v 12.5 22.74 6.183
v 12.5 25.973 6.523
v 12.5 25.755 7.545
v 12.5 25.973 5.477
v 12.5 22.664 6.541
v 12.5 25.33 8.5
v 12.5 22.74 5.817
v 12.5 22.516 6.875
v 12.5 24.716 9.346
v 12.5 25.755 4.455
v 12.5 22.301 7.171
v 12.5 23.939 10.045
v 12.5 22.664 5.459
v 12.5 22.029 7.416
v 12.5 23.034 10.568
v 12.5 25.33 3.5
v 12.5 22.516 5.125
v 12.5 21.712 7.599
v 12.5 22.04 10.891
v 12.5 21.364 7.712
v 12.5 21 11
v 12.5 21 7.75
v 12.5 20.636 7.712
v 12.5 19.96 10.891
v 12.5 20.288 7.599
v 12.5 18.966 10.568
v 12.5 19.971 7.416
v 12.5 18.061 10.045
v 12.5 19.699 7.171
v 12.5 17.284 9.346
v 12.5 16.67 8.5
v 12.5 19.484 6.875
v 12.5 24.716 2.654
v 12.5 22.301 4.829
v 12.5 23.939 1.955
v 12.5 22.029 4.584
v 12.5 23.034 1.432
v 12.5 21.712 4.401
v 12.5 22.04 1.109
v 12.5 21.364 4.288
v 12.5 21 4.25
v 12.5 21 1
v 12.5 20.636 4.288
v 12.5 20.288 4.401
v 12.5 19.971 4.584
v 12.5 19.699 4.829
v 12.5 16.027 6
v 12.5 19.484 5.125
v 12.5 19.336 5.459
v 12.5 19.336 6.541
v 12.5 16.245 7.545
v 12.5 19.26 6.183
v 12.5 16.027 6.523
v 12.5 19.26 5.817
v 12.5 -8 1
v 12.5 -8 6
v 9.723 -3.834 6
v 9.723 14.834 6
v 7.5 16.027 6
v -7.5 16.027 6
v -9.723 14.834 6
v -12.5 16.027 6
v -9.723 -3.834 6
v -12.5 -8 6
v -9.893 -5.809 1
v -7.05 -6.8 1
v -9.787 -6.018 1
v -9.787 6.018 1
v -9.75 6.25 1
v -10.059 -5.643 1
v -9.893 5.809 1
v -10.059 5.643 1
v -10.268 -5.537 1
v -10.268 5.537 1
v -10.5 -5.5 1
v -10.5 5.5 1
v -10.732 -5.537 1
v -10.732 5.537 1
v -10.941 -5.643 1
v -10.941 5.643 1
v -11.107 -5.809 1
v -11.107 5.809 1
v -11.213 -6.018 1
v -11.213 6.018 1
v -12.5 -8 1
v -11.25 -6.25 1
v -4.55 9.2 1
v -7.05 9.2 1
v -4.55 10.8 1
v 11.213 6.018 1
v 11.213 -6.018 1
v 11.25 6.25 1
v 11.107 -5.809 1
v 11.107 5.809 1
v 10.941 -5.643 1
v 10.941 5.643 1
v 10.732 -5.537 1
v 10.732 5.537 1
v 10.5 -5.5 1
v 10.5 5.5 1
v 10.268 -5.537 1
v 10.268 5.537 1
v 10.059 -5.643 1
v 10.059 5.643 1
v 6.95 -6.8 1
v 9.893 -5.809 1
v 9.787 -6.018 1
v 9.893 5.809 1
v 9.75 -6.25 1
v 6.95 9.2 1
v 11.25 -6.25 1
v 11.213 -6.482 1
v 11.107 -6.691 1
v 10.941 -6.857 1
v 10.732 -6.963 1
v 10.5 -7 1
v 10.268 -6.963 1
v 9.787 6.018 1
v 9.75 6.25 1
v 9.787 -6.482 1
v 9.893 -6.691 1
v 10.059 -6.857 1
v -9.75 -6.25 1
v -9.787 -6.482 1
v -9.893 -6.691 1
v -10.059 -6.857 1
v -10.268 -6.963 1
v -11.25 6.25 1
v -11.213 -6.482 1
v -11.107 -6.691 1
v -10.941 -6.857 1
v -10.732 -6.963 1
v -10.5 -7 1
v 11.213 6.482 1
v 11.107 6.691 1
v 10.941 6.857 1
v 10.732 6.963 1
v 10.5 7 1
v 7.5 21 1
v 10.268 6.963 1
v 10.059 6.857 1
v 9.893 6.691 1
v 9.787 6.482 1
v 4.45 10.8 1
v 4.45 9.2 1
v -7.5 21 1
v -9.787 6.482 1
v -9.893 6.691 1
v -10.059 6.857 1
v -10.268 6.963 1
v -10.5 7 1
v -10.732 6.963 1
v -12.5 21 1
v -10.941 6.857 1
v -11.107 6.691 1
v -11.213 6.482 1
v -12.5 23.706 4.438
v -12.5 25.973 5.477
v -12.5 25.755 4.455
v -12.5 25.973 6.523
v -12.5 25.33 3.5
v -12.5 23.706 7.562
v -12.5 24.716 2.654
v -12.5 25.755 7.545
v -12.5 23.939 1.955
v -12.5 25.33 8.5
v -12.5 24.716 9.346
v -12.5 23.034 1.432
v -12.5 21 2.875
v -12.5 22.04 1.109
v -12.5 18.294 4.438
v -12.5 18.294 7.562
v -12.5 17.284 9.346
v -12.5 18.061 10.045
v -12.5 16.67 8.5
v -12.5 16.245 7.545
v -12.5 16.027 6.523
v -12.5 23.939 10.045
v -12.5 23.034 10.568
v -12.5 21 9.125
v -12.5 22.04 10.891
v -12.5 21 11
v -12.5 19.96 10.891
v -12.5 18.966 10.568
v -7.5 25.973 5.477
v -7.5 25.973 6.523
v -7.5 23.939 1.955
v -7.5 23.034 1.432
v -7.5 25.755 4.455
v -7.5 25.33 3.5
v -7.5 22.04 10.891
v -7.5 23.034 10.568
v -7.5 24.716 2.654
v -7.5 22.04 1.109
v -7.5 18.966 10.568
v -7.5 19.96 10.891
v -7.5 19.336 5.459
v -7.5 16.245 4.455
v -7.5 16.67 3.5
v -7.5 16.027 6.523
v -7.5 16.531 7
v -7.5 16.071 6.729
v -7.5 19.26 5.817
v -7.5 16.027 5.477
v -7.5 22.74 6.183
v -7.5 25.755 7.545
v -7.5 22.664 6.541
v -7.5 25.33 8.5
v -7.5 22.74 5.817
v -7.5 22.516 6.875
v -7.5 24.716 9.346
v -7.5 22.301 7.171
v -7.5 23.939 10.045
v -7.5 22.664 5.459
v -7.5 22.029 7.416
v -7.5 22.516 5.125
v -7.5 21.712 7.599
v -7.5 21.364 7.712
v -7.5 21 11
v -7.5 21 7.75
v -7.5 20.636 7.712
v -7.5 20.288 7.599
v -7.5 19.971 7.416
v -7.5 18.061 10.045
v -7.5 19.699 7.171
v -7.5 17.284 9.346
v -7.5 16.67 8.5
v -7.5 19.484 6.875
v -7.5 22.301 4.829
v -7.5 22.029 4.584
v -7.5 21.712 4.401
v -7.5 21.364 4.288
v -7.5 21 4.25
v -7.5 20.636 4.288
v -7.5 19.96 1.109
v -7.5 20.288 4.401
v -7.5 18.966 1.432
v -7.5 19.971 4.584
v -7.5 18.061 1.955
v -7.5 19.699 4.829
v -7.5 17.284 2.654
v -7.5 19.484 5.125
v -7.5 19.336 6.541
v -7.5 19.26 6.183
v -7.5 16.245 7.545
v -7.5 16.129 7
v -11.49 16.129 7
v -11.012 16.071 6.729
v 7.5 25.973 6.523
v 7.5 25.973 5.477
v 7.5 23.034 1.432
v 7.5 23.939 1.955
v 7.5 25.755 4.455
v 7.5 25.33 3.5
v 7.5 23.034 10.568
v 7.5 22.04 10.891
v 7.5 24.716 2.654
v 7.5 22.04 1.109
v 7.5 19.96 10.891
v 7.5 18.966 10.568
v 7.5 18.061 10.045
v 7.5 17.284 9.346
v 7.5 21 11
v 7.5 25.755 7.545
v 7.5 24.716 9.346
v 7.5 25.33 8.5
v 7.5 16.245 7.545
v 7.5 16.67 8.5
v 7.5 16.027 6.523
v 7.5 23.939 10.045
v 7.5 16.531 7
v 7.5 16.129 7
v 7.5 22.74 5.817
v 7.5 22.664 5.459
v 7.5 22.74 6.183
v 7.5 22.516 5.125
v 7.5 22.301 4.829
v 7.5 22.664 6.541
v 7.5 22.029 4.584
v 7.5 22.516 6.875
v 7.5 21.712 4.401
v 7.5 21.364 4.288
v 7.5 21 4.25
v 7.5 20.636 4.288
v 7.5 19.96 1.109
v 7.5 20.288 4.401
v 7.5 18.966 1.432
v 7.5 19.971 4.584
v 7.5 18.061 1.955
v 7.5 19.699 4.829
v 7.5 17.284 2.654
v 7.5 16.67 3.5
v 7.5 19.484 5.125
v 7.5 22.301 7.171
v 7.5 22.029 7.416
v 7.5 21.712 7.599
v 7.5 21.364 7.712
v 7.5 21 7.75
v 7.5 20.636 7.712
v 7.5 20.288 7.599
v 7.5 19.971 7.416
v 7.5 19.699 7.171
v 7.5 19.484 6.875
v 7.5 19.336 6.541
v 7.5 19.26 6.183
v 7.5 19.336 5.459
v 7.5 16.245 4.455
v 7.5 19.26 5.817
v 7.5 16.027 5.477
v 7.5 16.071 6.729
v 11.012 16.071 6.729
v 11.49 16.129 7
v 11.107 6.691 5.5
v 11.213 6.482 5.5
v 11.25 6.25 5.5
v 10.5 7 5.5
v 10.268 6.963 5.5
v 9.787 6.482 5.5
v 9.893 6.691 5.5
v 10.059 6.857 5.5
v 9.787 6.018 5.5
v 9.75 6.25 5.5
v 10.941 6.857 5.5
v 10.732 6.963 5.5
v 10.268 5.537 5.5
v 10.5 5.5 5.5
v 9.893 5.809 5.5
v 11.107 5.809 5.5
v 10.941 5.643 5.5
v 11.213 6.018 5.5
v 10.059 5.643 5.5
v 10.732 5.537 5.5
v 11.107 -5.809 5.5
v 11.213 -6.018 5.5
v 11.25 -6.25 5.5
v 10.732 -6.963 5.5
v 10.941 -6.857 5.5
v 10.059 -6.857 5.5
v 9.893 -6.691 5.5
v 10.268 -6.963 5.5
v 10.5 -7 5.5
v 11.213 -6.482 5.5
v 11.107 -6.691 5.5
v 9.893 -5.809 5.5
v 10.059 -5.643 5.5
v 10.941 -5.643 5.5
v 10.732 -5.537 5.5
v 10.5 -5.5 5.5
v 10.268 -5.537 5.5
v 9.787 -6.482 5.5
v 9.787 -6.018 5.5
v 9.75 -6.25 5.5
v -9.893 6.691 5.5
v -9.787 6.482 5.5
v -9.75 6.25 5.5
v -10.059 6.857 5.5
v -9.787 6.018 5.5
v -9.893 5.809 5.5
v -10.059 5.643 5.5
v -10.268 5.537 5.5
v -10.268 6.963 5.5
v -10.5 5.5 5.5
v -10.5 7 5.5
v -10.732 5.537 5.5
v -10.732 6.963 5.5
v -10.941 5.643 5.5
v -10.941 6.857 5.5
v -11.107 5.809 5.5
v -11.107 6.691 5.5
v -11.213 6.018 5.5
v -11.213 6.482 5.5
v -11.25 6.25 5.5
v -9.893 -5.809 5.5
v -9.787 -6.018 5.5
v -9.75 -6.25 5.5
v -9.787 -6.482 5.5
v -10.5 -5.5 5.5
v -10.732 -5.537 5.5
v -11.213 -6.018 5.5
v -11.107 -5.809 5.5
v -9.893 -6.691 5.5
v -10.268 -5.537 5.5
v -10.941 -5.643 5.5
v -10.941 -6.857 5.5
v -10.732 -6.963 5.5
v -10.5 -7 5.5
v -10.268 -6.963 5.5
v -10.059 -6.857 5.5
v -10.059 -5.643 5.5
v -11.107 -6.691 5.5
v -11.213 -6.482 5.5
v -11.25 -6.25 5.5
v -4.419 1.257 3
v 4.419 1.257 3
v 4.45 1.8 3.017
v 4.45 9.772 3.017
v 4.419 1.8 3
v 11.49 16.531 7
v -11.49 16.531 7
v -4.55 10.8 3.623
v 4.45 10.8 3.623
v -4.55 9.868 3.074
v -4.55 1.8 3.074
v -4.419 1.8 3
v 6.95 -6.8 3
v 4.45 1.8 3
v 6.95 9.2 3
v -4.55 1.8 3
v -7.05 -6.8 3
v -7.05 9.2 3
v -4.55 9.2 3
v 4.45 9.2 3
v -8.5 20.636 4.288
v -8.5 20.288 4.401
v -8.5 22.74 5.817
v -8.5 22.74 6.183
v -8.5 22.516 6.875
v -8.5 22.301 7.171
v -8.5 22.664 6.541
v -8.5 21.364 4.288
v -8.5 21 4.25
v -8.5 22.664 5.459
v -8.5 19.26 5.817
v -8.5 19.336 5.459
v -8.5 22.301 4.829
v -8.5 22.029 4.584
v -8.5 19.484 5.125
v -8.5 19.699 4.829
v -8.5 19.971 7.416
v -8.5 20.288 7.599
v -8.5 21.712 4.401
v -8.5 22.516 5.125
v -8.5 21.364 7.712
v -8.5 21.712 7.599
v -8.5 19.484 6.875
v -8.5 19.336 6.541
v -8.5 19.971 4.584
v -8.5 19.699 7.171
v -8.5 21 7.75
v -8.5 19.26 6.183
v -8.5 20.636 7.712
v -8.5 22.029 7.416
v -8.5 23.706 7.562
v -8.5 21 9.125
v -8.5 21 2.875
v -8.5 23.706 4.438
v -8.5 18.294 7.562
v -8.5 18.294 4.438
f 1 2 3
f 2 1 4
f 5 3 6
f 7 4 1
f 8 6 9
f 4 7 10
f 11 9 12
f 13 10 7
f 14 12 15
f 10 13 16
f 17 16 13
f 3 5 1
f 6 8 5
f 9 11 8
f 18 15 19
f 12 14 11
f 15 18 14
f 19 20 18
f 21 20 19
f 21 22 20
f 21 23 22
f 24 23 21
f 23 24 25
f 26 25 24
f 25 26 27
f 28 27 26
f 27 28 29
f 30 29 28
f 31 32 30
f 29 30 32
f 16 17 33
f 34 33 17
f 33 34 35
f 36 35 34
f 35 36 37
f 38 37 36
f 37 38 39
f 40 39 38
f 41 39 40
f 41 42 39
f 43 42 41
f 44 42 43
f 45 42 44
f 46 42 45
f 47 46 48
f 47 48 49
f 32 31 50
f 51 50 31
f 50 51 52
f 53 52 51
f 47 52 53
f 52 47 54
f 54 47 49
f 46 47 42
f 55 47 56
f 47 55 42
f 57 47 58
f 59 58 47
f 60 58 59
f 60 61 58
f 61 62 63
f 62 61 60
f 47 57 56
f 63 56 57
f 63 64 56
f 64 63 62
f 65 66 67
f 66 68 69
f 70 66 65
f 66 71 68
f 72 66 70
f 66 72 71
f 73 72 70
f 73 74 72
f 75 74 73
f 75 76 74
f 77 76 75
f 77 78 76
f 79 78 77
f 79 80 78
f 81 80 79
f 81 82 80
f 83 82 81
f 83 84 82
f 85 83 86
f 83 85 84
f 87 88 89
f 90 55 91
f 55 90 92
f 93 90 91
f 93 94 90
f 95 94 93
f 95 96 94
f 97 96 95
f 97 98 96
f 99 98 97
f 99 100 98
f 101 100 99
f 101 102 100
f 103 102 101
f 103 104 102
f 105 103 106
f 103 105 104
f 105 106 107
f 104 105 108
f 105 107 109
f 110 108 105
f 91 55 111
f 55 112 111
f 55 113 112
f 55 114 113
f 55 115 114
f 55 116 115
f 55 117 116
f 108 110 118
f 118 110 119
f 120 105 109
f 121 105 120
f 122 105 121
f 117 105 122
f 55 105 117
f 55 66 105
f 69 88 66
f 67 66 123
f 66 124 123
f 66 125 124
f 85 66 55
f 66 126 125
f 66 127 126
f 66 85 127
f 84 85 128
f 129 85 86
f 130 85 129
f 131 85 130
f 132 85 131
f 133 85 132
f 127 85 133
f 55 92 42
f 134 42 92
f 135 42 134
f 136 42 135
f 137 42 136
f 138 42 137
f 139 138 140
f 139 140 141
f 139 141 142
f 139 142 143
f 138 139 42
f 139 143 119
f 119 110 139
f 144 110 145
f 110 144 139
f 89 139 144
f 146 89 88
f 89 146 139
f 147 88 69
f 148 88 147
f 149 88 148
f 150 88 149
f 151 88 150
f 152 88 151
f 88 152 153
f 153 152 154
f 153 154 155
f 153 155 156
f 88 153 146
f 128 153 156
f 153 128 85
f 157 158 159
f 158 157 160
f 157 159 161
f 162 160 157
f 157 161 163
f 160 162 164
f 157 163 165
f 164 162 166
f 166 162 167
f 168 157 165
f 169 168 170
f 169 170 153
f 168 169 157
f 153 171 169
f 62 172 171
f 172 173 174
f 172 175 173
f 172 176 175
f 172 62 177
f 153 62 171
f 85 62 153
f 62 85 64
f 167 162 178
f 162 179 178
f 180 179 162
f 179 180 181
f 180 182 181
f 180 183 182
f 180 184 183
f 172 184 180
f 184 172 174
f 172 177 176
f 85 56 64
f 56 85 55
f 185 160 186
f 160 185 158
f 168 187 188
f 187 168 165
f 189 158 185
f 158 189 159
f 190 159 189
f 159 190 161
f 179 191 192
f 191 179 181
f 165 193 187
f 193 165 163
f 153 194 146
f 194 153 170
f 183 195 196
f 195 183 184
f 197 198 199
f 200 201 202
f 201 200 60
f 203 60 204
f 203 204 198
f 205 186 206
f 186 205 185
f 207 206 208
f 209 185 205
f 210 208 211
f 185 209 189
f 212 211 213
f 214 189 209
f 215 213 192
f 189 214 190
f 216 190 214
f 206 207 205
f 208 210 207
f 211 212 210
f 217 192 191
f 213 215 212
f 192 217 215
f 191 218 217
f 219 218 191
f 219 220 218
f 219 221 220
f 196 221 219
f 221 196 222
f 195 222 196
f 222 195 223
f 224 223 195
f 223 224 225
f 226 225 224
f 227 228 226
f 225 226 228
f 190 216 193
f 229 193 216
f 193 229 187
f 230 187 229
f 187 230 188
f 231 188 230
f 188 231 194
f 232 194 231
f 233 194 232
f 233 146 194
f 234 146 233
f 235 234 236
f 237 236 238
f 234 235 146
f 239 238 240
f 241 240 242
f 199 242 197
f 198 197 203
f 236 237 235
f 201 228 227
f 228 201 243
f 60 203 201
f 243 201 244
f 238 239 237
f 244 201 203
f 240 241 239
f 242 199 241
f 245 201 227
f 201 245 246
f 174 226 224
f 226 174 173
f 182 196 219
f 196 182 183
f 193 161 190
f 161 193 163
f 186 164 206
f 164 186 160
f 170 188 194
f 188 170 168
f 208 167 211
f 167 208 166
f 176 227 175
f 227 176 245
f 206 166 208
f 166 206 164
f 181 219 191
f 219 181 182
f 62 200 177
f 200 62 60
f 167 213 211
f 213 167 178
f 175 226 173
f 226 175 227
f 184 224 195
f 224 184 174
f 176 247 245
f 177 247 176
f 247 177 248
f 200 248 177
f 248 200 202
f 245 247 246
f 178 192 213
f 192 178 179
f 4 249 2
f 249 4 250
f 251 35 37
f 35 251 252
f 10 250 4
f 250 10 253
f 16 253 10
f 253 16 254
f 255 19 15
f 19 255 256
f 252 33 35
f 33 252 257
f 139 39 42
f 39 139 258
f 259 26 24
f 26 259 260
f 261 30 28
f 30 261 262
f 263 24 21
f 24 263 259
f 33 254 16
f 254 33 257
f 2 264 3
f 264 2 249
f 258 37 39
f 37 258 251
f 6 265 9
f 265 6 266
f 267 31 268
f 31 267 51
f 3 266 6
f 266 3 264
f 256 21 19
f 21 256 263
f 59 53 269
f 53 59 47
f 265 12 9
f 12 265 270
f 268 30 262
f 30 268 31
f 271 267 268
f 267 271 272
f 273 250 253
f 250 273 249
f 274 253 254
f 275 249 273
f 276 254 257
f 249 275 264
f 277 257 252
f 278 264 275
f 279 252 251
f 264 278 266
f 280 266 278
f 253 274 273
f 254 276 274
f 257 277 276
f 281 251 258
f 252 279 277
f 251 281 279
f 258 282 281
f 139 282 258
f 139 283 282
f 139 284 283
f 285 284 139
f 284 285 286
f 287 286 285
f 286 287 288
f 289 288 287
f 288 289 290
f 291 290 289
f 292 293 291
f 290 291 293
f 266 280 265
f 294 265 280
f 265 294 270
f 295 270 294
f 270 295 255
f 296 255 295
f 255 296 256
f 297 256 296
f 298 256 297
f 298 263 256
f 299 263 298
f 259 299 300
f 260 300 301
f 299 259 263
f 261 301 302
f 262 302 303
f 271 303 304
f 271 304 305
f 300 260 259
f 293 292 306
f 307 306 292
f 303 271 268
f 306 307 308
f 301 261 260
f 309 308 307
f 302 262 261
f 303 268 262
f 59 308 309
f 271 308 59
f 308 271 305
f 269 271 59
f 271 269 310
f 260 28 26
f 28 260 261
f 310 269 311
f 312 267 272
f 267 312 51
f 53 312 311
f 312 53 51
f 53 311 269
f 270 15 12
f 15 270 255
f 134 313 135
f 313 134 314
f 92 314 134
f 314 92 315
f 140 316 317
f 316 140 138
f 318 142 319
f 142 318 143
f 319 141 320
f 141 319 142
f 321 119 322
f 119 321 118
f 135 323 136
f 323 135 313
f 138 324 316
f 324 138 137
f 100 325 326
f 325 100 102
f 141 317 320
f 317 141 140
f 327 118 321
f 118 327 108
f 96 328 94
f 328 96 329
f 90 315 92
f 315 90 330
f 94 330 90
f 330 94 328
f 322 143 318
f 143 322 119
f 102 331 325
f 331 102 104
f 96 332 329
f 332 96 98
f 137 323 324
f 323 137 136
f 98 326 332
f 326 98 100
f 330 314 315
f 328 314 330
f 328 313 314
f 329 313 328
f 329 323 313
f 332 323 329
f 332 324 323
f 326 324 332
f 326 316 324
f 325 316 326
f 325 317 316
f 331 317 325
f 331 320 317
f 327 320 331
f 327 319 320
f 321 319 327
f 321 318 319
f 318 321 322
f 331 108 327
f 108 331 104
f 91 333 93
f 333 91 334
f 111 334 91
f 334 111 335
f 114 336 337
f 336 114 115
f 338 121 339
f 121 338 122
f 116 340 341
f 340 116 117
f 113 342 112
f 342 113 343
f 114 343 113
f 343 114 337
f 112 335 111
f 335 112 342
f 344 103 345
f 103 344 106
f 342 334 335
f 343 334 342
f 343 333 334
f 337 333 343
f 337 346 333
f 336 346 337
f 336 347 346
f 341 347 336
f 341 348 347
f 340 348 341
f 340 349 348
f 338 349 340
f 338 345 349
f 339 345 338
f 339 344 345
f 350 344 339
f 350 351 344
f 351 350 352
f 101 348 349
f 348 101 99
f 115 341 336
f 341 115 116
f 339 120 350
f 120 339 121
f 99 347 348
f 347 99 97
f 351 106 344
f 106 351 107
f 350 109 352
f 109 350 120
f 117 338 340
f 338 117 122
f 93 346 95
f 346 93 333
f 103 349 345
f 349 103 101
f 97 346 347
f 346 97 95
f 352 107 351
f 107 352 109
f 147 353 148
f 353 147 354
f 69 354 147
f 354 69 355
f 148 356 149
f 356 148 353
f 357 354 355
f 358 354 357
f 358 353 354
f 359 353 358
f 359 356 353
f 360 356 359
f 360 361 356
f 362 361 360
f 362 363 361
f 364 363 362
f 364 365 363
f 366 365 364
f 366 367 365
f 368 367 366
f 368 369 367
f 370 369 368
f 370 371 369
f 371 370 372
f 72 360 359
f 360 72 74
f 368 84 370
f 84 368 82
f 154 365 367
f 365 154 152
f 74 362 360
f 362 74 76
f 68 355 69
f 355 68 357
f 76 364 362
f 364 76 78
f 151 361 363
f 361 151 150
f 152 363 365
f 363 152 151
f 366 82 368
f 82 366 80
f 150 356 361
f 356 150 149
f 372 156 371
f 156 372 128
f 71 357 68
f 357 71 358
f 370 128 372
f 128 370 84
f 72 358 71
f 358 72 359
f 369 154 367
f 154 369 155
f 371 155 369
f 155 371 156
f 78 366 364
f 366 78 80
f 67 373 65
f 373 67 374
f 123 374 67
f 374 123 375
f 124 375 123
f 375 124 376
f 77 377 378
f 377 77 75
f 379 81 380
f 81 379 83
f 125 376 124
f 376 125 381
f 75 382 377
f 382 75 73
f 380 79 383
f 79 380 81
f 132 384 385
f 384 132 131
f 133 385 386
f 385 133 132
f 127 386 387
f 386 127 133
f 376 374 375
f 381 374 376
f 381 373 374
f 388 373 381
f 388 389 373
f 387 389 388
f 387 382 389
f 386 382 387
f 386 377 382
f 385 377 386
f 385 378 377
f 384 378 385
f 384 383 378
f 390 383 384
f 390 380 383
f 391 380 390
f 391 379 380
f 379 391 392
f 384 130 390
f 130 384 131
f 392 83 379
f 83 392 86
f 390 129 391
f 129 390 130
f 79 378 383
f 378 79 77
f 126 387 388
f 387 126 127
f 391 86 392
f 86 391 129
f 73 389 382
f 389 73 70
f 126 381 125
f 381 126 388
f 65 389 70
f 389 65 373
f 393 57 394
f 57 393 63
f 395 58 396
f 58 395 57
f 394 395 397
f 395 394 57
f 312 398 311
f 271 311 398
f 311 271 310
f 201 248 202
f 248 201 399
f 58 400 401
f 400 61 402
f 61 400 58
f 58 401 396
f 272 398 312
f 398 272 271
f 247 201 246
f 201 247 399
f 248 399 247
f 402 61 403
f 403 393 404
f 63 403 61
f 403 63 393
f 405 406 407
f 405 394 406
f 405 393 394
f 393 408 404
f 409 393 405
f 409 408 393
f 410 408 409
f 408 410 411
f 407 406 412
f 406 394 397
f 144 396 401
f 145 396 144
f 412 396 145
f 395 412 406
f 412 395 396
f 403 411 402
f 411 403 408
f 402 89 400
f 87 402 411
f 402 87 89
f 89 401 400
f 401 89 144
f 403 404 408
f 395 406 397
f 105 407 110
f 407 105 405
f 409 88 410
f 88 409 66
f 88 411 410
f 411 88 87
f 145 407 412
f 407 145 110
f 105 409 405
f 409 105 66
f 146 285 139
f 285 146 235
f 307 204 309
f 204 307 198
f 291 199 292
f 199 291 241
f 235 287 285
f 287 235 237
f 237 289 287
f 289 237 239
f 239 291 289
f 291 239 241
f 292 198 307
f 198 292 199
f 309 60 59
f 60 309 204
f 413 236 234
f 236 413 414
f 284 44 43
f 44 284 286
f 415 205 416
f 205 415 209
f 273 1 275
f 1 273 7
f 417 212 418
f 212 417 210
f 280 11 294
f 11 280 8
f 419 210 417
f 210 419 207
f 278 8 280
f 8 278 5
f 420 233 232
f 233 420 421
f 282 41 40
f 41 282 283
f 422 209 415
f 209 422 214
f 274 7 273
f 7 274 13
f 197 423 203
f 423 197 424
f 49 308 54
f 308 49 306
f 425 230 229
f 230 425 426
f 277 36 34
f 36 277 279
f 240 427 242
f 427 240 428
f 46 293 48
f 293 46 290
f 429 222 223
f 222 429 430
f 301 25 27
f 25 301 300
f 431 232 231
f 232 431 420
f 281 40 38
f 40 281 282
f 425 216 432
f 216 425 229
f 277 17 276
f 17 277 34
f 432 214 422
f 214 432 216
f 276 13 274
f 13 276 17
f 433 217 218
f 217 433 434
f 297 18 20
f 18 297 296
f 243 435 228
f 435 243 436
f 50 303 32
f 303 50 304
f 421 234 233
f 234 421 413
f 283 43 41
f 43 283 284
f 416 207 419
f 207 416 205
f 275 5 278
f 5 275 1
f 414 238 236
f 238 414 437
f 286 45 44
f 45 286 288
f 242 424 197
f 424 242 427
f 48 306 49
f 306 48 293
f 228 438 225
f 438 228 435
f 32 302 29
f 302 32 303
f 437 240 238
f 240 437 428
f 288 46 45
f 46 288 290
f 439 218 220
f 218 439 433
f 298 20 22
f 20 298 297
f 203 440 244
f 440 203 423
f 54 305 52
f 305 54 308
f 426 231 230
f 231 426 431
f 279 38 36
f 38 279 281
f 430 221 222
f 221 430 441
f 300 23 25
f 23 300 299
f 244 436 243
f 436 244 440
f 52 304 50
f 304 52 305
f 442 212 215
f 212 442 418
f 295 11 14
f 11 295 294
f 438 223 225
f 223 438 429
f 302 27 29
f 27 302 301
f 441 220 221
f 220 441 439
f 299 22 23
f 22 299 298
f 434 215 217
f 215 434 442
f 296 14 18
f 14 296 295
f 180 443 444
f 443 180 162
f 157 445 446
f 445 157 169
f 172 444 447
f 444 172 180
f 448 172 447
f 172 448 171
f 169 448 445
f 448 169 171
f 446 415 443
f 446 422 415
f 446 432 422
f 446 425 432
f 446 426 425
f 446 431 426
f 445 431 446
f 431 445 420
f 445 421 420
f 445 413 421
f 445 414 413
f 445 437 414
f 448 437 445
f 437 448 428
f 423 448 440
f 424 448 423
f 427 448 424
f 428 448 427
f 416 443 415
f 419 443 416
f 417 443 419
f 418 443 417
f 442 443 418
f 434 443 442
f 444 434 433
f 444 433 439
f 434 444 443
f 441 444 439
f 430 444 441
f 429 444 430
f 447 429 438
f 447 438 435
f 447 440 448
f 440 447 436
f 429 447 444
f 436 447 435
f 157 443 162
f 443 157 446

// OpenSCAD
hole_w = 21;
hole_h = 12.5;

cam_w = 25;
cam_h = 24;

square = 9;
h = 5;

module screw(){
  translate([0, 0, -3.5])color("red")cylinder(h=10, d=1.5, $fn=20);
}
module screws(){
  translate([hole_w/2,  hole_h/2, -1])screw();
  translate([hole_w/2, -hole_h/2, -1])screw();
  translate([-hole_w/2,  hole_h/2, -1])screw();
  translate([-hole_w/2, -hole_h/2, -1])screw();
}

//color("gray")translate([0, 3.75, 0])import("RPi_Camera_V2.1.stl");

up = 6;

difference(){
  union(){
    translate([0, 4, 1])color("purple")translate([-cam_w / 2, -cam_h / 2, 0])cube([cam_w, cam_h + 5, h]);
    translate([-cam_w/2, 21, up])rotate([0, 90, 0])cylinder(d=10, h=5, $fn=30);
    translate([+cam_w/2-5, 21, up])rotate([0, 90, 0])cylinder(d=10, h=5, $fn=30);
  }
  
  translate([0, 5.5, 3])color([.3, .5, .2])scale([cam_w, cam_h, 1])rotate([0, 0, 45])cylinder(h=4, d2=1.3, d1=.5, $fn=4);

  translate([-4.55, 1.8, 0])color("red")cube([square, square, 100]);
  translate([-4.55-2.5, -11.8+5, .9])color("green")cube([14, 16, 2.1]);
 
color("red")translate([-(cam_w - 10) / 2, 21, up])rotate([0, 90, 0])cylinder(d=10, h=cam_w-10, $fn=30);
color("red")translate([-100, 21, up])rotate([0, 90, 0])cylinder(d=3.5, h=200, $fn=30);
color("red")translate([-10-cam_w/2+4, 21, up])rotate([0, 90, 0])cylinder(d=6.25, h=10, $fn=6);

  screws();
}
